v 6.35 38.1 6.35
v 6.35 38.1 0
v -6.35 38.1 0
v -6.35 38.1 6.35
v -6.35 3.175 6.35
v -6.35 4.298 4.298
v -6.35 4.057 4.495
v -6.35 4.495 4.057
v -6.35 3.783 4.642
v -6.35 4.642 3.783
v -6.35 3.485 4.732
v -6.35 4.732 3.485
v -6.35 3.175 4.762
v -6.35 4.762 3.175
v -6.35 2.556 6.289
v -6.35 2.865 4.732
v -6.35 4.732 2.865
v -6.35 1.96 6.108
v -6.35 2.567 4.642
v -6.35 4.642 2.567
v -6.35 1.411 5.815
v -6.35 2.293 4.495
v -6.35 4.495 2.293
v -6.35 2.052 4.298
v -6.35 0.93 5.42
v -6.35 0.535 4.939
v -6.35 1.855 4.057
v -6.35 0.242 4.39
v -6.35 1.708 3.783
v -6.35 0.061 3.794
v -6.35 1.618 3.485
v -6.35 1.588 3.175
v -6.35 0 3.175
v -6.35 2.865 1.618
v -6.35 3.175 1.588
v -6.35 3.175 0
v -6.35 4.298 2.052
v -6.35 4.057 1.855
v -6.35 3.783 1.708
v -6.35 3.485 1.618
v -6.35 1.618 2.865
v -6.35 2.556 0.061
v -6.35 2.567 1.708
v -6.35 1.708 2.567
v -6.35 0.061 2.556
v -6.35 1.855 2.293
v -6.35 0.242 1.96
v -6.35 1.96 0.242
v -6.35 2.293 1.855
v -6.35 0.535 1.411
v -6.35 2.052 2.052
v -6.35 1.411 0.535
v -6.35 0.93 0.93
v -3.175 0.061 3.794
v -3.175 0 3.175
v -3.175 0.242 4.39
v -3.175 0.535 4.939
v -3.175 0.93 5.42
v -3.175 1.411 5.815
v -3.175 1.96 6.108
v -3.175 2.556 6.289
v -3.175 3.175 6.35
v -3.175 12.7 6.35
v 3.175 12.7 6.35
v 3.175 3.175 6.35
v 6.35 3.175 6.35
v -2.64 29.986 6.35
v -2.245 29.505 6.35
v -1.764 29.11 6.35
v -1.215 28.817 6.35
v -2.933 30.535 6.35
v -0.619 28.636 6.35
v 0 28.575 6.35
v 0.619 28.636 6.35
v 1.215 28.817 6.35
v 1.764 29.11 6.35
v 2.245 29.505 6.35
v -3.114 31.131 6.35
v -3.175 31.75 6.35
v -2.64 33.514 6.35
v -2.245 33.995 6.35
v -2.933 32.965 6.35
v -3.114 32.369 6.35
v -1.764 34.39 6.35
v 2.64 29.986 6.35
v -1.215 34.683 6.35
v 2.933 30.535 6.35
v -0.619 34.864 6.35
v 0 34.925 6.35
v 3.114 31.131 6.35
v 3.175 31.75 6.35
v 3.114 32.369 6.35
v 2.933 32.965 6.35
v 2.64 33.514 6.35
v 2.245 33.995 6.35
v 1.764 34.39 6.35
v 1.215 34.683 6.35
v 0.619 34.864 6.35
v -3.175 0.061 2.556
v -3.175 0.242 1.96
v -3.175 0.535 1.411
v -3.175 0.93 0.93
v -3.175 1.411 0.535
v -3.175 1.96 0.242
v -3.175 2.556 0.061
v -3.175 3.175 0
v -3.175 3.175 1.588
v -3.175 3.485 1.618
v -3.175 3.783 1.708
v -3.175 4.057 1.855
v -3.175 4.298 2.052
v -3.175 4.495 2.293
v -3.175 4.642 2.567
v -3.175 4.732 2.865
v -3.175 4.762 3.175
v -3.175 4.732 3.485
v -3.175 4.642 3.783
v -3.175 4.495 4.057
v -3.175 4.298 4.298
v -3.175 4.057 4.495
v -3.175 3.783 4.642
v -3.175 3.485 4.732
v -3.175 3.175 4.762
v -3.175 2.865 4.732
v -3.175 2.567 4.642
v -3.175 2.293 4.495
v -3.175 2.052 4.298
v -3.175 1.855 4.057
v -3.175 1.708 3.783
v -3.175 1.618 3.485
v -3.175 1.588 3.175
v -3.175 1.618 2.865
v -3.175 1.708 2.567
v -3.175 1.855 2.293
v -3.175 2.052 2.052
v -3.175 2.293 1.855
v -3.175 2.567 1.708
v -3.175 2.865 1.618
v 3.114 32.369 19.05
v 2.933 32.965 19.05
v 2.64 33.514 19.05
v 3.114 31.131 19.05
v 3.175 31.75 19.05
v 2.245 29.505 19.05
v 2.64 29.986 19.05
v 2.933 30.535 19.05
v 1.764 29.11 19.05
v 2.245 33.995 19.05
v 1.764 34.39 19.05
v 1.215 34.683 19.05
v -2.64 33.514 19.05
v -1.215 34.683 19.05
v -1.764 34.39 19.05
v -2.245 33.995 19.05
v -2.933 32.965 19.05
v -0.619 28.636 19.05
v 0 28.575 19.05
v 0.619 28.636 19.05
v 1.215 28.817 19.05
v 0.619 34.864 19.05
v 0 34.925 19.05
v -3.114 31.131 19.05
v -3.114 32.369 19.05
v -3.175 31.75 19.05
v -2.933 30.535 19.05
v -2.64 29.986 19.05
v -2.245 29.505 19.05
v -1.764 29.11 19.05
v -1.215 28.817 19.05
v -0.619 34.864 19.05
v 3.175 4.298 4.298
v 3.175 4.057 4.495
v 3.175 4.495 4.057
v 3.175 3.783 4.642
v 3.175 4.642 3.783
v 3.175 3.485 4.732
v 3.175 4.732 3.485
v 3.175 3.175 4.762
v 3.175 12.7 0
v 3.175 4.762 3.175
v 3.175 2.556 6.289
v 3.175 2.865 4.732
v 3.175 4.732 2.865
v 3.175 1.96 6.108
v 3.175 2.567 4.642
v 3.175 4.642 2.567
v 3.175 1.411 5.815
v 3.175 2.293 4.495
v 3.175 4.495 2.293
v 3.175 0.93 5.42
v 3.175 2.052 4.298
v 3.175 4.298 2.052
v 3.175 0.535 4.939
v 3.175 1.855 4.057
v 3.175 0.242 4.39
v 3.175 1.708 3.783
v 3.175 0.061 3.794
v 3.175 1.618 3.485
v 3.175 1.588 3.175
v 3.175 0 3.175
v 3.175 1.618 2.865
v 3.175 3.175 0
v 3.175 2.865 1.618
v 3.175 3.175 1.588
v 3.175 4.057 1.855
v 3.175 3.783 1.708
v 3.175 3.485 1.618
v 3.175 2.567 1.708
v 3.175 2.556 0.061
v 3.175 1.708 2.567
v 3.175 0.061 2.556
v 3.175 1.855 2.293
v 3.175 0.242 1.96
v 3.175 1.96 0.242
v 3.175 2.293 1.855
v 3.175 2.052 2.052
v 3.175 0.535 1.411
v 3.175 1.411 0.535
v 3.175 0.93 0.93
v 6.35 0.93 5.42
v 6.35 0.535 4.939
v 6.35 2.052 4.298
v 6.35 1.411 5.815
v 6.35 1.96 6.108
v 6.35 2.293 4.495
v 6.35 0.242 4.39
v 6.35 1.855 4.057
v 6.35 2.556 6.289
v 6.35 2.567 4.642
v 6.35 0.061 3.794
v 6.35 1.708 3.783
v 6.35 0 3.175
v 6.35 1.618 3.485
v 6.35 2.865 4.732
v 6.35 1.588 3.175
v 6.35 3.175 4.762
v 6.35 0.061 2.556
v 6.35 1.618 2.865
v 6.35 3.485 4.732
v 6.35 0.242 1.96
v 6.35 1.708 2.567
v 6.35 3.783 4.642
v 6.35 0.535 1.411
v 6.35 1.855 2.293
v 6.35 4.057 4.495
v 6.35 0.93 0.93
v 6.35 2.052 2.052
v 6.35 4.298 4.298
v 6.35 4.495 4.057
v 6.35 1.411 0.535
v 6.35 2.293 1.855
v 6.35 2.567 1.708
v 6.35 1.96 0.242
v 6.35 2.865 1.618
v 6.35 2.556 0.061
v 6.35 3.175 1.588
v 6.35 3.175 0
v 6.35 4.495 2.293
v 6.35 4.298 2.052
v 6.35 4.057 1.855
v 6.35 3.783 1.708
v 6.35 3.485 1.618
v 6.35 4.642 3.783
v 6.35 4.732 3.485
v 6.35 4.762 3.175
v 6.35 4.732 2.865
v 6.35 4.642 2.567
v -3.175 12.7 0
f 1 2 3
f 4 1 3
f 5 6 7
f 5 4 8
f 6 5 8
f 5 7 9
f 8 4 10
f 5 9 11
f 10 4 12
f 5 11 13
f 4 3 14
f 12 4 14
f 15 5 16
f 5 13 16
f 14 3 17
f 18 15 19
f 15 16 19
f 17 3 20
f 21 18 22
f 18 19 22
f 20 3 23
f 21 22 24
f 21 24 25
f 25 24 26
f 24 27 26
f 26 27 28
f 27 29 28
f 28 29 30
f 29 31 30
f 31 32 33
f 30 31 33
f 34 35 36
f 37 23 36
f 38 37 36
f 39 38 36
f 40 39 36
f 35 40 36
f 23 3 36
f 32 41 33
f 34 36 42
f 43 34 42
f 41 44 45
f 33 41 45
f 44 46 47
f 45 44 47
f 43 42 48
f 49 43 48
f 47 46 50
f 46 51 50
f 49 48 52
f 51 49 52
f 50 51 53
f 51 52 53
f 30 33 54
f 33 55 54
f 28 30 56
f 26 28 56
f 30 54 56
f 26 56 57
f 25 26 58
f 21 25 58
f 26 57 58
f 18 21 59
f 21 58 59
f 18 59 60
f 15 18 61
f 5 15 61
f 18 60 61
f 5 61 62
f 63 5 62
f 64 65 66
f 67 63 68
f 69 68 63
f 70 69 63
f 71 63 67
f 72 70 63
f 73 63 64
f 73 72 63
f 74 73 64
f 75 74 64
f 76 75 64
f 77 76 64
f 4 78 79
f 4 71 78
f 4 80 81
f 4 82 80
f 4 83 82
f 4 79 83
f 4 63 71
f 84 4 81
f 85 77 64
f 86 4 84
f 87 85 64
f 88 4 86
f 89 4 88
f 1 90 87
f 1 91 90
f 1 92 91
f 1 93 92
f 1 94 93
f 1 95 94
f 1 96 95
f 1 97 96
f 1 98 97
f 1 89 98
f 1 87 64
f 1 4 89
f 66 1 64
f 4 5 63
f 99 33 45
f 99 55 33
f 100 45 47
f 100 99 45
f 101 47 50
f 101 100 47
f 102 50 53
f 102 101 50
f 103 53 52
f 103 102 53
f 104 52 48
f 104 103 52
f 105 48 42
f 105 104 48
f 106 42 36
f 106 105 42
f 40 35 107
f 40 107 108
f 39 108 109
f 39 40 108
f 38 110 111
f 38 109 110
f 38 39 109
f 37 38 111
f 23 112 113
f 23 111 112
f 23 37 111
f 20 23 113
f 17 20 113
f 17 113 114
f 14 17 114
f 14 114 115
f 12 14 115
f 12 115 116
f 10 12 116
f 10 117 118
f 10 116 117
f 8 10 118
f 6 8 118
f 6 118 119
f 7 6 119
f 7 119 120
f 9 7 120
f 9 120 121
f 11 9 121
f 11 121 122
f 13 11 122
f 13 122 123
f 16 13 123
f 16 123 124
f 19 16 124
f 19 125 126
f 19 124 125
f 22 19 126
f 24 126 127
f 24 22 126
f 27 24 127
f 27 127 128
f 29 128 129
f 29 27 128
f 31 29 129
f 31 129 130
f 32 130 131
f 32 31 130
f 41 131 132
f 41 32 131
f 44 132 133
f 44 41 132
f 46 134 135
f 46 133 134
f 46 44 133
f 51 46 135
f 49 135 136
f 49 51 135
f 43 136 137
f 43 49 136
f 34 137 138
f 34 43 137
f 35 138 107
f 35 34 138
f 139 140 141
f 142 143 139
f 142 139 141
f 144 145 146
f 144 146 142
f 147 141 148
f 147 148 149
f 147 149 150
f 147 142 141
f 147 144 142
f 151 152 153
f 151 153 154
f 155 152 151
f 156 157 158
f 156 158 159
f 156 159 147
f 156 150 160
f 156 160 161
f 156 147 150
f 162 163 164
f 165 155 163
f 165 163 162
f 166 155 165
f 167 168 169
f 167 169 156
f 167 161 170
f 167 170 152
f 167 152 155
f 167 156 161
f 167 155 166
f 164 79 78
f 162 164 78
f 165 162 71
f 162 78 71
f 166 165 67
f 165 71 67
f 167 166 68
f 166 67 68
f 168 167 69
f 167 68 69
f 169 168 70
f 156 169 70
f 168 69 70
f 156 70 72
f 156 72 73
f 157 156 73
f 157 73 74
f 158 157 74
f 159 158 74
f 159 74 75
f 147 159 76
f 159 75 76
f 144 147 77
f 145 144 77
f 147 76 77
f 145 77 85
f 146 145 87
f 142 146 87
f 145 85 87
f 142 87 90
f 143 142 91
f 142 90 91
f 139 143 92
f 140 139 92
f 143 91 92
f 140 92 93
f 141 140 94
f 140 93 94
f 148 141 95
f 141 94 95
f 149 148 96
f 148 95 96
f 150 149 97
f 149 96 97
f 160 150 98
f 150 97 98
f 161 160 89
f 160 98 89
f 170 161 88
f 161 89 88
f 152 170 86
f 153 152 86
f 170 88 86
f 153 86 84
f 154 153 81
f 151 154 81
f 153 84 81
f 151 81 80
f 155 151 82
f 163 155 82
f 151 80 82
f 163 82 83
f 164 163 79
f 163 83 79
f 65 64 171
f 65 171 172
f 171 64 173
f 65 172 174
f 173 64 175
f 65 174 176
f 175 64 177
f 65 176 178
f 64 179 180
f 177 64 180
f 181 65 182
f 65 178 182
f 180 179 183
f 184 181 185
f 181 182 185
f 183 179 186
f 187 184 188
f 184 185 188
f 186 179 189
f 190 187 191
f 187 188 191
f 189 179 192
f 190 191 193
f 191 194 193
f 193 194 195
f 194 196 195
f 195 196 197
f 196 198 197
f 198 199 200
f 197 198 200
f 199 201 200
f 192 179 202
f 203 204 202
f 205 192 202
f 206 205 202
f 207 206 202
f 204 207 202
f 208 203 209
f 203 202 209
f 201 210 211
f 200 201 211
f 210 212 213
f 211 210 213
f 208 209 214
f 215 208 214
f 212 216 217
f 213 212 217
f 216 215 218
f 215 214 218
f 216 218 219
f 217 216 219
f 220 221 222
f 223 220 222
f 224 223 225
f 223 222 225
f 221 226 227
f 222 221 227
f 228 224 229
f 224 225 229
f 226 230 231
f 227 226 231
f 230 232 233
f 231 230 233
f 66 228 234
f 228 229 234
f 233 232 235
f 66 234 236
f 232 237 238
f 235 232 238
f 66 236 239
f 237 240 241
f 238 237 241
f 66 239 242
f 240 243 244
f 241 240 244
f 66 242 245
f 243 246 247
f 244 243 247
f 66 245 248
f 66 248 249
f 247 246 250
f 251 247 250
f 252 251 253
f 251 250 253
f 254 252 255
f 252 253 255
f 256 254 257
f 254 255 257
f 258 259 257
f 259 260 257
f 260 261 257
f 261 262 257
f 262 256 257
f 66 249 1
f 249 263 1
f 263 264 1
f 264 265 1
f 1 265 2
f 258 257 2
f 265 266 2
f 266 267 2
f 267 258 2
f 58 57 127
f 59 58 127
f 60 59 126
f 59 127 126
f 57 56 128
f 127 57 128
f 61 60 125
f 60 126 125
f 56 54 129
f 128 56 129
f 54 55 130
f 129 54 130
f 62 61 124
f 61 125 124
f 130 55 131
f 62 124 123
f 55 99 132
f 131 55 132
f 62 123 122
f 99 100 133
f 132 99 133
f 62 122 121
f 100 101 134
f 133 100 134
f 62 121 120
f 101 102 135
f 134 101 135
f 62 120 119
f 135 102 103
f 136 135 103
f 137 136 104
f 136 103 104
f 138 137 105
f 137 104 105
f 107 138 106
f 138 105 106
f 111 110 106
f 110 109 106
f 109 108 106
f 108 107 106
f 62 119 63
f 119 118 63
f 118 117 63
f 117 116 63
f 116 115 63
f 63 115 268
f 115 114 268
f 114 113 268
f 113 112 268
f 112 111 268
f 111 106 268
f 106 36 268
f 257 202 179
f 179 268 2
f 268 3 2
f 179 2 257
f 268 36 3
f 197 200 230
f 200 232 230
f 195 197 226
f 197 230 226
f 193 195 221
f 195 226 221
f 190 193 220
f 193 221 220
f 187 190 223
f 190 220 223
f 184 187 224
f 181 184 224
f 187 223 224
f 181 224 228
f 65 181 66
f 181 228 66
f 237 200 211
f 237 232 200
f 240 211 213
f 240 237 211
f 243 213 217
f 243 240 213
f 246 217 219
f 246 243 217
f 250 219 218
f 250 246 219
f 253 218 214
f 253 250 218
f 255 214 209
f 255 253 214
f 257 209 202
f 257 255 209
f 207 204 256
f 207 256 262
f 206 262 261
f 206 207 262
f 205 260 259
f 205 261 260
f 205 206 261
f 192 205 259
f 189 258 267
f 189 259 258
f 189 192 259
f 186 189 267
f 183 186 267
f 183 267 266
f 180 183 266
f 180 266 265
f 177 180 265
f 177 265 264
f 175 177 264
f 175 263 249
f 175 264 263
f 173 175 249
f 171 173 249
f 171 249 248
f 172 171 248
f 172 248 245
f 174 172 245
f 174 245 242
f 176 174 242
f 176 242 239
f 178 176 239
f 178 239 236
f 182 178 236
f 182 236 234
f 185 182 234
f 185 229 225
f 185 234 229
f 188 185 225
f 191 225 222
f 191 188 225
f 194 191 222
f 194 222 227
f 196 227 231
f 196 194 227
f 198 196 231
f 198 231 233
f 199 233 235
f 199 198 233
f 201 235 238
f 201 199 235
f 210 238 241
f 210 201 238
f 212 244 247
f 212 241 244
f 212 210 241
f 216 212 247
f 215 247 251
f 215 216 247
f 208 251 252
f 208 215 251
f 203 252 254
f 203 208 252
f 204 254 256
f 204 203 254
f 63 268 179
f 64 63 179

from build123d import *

# Parameters (mm, degrees)
BOSS_EXTRUDE1_DEPTH     = 6.35
FILLET1_R               = 3.175
CUT_EXTRUDE1_DEPTH      = 40.144028919
CUT_EXTRUDE1_DEPTH_BACK = 40.144028919
SKETCH2_R               = 1.5875
SKETCH3_R               = 3.175
BOSS_EXTRUDE2_DEPTH     = 12.7


with BuildPart() as part:
    # Sketch1 → Boss-Extrude1 (new body)
    with BuildSketch(Plane.XY):
        Polygon((3.175, 0), (6.35, 0), (6.35, 38.1), (-6.35, 38.1), (-6.35, 0), (-3.175, 0), (-3.175, 12.7), (3.175, 12.7), align=None)
    extrude(amount=BOSS_EXTRUDE1_DEPTH)

    # Fillet1
    fillet1_edges = [part.edges().sort_by_distance(p)[0] for p in [
        (-4.7625, 0, 0),
        (-4.7625, 0, 6.35),
        (4.7625, 0, 0),
        (4.7625, 0, 6.35),
    ]]
    fillet(fillet1_edges, radius=FILLET1_R - 0.0001)  # a hair under: the kernel refuses the full size

    # Sketch2 → Cut-Extrude1 (cut, two sides: drawn at the far end of the back side and taken through both)
    with BuildSketch(Plane(origin=(0, 0, 0), x_dir=(0, 0, -1), z_dir=(1, 0, 0)).offset(-CUT_EXTRUDE1_DEPTH_BACK)):
        with Locations((-3.175, 3.175)):
            Circle(SKETCH2_R)
    extrude(amount=CUT_EXTRUDE1_DEPTH + CUT_EXTRUDE1_DEPTH_BACK, mode=Mode.SUBTRACT)

    # Sketch3 → Boss-Extrude2 (add)
    with BuildSketch(Plane.XY.offset(6.35)):
        with Locations(Location((0, 31.75, 0), (0, 0, 180))):
            Circle(SKETCH3_R)
    extrude(amount=BOSS_EXTRUDE2_DEPTH)


solid = part.part
